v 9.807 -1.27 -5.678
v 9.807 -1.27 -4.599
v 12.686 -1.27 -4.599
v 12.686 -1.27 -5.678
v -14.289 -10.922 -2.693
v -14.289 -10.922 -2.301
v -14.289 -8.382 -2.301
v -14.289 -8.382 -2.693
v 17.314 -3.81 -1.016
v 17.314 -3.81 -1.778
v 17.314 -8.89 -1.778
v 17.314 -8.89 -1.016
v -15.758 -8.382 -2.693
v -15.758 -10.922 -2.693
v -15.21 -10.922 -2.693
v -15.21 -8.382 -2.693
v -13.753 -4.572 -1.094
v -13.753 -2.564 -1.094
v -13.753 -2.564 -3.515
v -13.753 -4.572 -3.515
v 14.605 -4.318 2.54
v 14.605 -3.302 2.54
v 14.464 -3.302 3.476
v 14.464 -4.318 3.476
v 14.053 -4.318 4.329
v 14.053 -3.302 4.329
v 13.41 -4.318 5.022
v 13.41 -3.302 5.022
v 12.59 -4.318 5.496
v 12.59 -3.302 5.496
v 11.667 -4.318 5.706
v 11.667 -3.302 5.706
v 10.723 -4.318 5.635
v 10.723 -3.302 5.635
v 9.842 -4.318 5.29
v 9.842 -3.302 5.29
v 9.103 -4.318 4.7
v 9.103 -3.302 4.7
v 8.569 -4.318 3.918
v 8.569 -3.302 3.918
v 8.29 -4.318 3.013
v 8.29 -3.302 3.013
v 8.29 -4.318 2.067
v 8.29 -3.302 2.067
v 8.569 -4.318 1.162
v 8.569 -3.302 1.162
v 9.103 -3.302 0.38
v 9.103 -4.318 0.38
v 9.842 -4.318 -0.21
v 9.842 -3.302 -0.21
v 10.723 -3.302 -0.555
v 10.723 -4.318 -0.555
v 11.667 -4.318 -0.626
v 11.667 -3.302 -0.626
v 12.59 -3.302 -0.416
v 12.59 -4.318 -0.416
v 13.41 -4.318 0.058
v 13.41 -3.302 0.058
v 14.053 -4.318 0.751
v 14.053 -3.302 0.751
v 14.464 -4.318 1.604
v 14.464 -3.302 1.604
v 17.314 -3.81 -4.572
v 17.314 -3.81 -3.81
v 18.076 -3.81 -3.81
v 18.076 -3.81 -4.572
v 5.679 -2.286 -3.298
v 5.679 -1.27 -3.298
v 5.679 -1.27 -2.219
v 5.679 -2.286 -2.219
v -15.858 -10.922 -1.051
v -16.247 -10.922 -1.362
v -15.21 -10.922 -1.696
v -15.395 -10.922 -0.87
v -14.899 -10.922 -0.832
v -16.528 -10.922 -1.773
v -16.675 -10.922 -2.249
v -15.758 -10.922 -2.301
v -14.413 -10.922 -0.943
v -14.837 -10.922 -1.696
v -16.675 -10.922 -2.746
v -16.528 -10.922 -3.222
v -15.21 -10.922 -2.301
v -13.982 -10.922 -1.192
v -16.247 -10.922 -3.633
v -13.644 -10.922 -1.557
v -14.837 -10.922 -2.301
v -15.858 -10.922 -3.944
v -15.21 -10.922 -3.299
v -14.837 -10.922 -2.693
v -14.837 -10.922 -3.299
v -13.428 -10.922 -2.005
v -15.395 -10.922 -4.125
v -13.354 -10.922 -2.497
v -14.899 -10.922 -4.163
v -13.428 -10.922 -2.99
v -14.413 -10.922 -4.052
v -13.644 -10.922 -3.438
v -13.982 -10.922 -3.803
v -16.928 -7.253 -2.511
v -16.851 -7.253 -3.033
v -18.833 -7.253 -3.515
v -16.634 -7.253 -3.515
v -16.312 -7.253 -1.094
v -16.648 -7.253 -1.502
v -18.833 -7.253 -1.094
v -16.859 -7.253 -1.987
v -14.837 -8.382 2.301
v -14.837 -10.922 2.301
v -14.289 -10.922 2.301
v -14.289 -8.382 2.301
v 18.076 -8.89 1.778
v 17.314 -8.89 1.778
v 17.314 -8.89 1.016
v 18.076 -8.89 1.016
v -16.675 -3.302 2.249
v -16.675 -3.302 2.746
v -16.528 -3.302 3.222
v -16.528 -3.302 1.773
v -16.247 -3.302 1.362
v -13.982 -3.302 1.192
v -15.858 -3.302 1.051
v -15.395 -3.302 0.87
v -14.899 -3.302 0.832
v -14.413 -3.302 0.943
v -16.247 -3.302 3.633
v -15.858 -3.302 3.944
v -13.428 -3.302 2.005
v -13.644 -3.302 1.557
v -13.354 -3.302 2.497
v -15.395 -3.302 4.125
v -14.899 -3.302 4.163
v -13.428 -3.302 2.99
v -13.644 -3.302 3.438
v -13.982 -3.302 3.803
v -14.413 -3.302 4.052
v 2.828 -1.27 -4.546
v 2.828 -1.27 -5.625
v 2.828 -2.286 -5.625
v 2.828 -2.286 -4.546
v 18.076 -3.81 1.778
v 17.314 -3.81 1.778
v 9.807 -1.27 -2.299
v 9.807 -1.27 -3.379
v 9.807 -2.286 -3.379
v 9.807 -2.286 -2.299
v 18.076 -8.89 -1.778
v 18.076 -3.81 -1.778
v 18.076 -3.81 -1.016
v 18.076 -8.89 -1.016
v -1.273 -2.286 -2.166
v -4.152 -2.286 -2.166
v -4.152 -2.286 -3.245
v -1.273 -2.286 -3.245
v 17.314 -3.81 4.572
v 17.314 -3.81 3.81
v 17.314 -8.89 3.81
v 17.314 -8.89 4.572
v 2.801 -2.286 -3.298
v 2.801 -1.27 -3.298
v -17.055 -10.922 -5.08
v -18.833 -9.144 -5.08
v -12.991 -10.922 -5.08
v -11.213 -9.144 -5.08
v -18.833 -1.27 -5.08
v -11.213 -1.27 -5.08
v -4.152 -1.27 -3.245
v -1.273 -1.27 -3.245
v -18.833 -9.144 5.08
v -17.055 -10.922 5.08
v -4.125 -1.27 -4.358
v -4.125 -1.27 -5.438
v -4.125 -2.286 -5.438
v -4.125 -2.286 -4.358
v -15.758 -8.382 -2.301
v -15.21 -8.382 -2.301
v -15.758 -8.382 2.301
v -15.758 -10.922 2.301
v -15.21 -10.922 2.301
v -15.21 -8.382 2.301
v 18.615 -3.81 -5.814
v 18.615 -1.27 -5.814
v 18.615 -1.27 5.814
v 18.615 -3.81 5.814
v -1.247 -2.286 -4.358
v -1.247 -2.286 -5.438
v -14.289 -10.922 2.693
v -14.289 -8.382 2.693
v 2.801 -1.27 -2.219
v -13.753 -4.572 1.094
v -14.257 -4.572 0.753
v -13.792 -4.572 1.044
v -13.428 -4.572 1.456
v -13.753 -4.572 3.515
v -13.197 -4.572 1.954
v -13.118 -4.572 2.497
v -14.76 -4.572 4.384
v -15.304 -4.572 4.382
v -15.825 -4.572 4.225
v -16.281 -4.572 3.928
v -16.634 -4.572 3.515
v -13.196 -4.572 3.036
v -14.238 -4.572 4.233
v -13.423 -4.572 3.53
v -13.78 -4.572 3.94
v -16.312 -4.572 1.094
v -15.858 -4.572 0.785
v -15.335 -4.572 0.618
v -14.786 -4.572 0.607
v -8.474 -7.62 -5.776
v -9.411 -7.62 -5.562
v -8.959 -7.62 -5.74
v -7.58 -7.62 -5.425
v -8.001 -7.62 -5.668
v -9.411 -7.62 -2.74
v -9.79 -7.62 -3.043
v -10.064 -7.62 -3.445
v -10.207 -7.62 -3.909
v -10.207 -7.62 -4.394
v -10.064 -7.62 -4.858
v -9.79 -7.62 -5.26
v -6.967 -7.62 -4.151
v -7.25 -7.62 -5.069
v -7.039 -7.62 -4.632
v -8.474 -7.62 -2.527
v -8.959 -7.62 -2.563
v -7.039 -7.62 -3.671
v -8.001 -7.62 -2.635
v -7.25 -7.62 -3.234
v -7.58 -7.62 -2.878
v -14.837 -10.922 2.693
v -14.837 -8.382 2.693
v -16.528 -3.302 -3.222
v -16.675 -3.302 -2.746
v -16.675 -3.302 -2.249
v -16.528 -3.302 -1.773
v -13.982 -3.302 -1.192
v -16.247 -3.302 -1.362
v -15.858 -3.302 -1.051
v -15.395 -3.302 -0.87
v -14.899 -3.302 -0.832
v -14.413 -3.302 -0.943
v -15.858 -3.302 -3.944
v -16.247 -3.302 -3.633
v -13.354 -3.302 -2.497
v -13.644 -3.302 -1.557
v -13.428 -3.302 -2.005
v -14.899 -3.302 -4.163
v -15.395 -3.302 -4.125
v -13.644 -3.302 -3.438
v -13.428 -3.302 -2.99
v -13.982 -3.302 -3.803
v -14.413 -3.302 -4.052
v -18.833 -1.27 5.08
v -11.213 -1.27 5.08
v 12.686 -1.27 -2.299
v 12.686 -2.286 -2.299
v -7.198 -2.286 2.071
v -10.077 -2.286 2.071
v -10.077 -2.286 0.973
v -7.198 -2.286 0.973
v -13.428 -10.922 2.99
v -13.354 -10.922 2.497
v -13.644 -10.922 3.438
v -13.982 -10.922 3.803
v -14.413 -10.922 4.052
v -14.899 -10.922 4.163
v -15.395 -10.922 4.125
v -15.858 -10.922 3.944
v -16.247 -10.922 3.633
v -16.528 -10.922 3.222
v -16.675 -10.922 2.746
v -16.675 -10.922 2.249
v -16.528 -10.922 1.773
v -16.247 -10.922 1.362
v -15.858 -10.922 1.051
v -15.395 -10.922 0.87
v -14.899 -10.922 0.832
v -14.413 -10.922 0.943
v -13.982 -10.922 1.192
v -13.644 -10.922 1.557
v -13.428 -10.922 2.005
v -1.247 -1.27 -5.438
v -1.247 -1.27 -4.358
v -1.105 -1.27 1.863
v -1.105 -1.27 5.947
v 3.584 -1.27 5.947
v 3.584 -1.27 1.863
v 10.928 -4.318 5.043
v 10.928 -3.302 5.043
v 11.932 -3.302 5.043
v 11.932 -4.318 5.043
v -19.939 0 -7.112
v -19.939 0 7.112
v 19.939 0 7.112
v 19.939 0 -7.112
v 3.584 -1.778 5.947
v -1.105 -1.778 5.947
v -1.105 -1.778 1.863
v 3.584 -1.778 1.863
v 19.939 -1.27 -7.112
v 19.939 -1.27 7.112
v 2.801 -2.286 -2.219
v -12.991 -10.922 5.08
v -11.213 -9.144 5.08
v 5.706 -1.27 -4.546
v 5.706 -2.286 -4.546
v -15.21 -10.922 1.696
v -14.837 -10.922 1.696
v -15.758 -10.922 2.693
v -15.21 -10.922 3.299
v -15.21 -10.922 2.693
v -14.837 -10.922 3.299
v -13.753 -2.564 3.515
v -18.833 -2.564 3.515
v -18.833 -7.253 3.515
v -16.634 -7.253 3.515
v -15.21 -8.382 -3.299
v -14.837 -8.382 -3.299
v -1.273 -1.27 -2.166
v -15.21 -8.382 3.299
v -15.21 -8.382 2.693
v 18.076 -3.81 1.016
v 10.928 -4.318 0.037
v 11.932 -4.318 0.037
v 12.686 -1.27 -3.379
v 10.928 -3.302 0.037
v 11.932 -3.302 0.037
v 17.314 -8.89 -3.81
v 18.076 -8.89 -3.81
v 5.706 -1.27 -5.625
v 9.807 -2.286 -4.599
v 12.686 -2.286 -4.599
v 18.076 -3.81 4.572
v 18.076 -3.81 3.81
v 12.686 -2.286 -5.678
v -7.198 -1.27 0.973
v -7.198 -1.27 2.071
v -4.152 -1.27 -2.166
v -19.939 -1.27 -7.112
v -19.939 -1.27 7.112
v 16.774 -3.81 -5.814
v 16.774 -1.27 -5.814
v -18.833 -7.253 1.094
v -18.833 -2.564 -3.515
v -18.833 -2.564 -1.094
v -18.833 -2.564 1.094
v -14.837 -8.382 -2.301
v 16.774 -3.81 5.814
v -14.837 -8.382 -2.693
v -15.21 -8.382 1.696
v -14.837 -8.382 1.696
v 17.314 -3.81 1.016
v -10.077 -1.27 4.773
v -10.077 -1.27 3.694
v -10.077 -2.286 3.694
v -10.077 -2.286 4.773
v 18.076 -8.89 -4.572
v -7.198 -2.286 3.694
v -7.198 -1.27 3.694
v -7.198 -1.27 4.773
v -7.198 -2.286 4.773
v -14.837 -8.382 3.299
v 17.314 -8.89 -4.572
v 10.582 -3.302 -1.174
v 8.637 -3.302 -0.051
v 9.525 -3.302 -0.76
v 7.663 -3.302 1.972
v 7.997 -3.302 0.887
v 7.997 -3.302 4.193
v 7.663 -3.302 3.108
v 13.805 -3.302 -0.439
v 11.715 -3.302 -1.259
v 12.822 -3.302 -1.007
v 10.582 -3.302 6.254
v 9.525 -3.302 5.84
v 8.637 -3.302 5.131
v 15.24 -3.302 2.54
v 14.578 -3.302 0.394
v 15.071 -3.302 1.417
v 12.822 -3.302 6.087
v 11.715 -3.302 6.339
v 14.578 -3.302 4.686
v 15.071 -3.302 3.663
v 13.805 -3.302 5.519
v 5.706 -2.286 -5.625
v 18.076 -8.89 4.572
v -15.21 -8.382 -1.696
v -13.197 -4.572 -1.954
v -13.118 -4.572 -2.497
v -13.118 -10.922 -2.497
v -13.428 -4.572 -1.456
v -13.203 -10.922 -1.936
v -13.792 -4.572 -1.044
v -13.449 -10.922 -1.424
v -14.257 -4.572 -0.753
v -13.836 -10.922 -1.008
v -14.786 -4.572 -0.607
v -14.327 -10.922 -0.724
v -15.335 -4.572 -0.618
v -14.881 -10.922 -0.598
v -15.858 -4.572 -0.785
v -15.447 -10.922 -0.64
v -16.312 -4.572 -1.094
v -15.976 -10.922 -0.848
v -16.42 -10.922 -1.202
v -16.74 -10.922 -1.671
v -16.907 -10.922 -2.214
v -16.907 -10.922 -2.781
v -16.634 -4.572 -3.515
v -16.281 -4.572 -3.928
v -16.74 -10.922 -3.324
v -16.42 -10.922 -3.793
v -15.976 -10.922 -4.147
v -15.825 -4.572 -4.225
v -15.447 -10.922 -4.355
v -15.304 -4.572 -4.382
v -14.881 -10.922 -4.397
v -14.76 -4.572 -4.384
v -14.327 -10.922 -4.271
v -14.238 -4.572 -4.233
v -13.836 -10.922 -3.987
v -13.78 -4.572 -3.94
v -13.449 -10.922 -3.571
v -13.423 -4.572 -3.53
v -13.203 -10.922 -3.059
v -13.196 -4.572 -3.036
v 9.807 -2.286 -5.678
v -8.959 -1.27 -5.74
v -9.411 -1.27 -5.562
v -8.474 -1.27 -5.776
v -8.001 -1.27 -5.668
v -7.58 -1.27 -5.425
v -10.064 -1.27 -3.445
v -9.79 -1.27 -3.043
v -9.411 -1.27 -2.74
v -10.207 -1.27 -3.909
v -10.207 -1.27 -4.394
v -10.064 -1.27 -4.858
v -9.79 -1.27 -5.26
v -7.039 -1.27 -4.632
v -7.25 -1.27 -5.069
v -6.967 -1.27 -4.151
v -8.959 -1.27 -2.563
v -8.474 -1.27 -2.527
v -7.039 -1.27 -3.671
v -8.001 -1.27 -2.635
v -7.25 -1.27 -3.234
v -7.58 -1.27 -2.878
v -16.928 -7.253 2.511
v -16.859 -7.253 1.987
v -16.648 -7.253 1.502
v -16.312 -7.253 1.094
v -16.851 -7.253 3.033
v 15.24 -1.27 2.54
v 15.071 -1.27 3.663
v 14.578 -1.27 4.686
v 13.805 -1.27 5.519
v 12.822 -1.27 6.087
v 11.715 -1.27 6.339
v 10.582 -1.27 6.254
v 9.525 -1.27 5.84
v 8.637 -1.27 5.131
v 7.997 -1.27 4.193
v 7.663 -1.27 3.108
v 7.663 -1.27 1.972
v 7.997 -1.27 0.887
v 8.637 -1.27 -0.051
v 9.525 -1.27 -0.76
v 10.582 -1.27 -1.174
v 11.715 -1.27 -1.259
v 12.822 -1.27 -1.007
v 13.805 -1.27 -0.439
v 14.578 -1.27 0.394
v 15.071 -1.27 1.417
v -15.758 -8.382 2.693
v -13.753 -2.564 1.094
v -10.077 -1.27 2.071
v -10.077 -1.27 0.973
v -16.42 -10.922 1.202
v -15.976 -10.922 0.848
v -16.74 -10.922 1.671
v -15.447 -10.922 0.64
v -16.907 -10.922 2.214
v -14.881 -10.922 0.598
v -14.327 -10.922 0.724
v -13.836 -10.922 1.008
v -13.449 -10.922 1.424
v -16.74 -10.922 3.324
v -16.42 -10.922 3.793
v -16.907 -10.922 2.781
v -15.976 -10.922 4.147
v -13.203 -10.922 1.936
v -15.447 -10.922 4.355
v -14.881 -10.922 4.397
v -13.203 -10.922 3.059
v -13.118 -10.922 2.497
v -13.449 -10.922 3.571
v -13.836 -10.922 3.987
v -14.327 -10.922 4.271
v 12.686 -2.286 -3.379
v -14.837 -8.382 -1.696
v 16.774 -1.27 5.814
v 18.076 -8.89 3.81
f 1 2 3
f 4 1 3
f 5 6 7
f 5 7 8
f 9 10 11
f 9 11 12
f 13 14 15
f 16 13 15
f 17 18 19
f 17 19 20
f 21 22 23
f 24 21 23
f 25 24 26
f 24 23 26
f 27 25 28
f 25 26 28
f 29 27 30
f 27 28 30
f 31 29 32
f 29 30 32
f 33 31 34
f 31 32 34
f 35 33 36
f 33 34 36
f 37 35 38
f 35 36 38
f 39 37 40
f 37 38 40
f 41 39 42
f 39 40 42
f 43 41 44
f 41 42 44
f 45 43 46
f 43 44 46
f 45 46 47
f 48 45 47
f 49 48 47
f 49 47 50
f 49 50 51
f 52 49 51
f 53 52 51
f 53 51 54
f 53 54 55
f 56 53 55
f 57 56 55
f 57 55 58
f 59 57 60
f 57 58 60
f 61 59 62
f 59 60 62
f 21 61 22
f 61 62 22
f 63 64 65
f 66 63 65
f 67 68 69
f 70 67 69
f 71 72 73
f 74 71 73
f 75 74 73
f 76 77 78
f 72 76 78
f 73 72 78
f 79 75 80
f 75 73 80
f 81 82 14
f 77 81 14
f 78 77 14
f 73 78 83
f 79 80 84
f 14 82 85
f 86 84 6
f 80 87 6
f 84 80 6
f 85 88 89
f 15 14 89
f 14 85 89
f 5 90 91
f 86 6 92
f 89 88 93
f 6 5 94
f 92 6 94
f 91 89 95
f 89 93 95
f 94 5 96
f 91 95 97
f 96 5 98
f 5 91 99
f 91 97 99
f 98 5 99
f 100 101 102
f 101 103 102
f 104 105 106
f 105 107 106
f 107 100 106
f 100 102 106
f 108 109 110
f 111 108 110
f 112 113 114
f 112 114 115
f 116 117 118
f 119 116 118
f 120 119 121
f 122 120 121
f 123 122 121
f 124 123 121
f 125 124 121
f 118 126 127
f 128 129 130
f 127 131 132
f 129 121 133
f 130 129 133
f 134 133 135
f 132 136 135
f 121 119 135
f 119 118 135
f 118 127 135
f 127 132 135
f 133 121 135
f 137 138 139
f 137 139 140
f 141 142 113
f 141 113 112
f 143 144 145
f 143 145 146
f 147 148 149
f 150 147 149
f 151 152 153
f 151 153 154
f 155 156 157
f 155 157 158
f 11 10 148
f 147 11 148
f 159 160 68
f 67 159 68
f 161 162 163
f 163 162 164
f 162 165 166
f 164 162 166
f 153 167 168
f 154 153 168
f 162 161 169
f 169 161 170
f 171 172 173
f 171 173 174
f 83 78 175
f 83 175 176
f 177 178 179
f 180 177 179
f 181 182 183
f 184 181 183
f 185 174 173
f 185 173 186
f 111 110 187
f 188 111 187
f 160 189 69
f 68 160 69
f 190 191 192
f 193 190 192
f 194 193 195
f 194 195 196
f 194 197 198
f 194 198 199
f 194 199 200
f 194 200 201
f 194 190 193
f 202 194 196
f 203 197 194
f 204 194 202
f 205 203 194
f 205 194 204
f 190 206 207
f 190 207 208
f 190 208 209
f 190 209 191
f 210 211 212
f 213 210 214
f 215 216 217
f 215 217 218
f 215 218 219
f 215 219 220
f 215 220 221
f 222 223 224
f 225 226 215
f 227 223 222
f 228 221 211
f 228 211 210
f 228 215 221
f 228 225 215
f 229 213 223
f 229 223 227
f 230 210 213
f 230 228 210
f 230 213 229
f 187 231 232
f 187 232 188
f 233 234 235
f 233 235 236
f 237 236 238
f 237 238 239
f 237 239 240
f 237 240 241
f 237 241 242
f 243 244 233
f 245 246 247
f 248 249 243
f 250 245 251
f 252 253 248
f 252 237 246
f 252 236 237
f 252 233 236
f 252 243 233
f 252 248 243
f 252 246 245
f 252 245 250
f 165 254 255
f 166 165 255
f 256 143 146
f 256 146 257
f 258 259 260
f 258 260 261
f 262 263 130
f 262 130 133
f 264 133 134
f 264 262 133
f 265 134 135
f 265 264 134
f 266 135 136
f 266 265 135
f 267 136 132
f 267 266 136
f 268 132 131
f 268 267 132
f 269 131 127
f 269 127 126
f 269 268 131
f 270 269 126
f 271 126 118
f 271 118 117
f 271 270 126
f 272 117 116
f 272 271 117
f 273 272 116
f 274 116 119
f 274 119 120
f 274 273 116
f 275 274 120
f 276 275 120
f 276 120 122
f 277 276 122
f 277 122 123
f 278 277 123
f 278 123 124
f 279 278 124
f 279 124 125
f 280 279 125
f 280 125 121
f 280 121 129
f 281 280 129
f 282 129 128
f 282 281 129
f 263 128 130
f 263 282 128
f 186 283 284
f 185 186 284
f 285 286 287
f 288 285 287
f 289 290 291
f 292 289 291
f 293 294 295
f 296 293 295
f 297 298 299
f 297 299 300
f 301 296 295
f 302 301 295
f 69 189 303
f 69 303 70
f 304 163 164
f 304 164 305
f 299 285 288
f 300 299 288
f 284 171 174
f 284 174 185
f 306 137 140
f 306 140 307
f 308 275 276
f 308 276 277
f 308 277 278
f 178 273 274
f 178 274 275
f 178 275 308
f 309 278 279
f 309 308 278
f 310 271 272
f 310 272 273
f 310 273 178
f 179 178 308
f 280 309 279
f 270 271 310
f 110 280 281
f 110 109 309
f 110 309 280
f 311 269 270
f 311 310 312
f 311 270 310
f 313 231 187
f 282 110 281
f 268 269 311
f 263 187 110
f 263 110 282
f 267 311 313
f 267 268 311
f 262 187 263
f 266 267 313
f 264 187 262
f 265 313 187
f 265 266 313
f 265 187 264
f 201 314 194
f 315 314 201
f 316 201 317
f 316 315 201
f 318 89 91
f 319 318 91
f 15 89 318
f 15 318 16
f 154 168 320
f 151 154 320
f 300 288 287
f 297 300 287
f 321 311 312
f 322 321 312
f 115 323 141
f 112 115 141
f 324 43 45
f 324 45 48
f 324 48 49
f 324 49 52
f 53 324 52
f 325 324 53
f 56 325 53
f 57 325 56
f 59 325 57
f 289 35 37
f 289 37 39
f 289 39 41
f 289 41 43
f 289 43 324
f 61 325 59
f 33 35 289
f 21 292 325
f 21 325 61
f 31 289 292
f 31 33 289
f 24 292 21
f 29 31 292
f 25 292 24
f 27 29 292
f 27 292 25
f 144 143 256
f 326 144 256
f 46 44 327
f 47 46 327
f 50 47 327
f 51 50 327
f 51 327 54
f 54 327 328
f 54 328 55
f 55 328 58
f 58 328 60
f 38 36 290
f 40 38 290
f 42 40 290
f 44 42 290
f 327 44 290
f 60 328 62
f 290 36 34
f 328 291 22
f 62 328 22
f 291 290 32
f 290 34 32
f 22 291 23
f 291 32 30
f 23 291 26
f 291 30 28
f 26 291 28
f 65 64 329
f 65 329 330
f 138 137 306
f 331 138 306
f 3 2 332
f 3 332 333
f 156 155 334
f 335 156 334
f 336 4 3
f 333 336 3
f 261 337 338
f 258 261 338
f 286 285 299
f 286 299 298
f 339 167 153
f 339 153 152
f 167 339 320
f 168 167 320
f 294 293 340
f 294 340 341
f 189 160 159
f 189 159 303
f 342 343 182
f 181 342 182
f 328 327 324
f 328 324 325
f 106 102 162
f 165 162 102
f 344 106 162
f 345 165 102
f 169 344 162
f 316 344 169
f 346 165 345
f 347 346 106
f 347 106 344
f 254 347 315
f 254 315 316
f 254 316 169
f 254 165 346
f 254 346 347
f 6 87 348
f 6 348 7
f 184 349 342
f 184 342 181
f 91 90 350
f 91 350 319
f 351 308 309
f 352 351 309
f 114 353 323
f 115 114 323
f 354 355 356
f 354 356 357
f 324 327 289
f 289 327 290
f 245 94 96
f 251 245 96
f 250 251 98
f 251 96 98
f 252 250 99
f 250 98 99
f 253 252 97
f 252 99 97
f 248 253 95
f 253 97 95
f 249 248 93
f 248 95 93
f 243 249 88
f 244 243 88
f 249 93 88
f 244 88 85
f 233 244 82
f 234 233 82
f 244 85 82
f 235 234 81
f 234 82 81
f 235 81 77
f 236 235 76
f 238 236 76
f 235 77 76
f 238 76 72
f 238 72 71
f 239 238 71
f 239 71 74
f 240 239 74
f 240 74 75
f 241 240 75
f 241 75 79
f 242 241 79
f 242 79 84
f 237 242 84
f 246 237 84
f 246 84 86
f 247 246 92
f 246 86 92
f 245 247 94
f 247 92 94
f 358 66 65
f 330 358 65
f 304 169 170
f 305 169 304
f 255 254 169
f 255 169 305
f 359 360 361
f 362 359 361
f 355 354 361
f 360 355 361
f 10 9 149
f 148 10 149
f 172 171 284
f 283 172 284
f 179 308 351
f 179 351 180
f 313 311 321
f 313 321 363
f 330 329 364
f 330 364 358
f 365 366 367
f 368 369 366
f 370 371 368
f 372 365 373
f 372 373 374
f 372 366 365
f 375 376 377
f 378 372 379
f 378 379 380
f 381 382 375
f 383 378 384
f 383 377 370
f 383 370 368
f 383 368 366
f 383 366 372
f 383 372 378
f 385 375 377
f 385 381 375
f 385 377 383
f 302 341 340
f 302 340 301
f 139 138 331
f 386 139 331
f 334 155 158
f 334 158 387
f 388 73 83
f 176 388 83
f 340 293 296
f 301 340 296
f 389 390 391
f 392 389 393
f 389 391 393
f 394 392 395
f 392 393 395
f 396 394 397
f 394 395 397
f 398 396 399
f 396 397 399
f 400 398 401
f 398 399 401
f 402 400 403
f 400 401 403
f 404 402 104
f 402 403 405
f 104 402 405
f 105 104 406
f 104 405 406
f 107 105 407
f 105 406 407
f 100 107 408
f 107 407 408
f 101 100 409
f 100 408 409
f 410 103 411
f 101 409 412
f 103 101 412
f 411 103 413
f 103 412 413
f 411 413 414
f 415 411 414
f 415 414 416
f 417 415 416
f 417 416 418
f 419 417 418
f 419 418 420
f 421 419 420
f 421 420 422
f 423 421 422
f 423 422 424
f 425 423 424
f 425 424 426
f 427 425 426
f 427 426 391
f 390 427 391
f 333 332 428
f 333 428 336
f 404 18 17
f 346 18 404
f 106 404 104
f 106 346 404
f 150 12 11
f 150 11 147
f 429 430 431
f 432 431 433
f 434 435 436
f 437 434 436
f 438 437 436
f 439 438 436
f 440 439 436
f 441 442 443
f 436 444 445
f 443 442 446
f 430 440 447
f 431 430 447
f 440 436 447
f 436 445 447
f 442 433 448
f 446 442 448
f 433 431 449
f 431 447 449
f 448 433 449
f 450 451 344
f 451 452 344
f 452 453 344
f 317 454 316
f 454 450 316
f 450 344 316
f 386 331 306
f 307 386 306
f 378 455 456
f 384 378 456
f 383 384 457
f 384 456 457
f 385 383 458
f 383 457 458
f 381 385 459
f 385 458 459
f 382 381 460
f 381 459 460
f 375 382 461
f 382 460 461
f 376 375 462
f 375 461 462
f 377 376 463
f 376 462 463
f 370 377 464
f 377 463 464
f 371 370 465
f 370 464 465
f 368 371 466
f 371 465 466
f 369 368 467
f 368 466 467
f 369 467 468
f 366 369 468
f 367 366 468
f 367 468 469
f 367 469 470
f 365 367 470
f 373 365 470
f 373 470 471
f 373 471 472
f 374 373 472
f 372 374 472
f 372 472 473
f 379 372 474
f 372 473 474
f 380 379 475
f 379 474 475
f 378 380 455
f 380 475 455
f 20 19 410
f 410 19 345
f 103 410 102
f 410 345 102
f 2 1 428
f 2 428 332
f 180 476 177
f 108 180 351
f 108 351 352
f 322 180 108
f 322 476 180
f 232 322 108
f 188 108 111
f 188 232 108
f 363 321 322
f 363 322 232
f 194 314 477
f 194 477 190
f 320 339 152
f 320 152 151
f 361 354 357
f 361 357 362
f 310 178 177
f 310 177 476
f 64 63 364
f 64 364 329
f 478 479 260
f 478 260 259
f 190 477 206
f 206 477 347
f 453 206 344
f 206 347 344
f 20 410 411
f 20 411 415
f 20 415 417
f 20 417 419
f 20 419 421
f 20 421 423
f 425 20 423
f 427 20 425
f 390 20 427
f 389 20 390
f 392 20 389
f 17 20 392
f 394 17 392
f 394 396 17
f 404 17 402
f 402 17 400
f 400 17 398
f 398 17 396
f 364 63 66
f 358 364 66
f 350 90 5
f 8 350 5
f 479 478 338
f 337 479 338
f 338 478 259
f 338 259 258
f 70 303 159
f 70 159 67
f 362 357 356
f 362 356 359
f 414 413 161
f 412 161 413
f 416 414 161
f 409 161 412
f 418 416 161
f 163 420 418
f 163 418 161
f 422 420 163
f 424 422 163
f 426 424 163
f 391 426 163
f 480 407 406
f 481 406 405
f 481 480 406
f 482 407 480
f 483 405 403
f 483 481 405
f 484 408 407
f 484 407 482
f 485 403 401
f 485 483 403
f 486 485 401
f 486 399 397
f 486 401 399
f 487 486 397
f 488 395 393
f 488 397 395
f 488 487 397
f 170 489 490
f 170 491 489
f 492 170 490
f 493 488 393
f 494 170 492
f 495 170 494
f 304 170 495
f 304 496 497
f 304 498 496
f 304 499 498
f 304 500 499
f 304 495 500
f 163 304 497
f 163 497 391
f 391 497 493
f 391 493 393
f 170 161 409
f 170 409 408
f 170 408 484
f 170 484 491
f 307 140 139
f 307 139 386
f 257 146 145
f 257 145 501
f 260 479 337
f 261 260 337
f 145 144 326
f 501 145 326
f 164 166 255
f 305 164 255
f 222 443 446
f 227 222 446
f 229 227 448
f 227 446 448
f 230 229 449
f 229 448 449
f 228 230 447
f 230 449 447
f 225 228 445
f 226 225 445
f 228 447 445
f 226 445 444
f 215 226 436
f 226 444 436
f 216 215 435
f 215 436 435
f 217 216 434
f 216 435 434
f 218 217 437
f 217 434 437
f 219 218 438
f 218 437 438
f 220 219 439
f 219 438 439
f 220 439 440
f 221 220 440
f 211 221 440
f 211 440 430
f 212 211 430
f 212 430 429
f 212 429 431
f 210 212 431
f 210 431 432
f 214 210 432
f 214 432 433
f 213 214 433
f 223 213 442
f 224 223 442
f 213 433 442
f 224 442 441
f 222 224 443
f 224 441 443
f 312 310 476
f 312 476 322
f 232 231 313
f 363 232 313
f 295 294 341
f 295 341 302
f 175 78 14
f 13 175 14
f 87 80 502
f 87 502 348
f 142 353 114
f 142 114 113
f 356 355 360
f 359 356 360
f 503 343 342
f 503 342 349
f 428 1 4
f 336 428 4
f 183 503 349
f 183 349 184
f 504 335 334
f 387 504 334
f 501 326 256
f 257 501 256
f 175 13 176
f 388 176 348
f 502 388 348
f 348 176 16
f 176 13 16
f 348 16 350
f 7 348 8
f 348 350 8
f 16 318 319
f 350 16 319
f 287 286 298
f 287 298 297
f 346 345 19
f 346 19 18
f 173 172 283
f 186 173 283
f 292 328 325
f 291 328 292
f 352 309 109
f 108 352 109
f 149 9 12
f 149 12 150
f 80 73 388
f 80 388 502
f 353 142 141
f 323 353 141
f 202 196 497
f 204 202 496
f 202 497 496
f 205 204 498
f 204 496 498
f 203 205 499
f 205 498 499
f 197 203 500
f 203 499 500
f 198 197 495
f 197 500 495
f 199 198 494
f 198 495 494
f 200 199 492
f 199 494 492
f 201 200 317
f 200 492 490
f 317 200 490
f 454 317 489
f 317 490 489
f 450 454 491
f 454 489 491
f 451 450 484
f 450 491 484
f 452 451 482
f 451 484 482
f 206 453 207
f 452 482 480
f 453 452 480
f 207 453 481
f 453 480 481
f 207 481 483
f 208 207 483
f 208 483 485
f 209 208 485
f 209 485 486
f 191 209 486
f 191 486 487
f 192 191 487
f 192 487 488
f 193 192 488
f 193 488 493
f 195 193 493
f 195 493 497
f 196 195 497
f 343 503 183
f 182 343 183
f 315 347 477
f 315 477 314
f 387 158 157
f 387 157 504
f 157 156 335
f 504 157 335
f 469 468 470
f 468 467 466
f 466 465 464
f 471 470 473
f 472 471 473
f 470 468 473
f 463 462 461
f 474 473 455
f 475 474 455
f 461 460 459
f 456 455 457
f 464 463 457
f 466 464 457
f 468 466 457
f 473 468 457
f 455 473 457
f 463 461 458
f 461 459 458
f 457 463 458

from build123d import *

# Parameters (mm, degrees)
F0_W      = 39.878
F0_H      = 14.224
F1_DEPTH  = 1.27
F2_W      = 7.62
F2_H      = 10.16
F3_DEPTH  = 9.652
F4_SIZE   = 1.778
F5_R      = 1.905
F6_DEPTH  = 6.35
F7_W      = 4.6894205734
F7_H      = 2.4203467183
F8_DEPTH  = 5.08
F9_R      = 1.6697821783
F10_DEPTH = 7.62
F11_W     = 0.3728192511
F11_H     = 0.6050870288
F11_W_2   = 0.5483608693
F11_H_2   = 0.3921133466
F12_DEPTH = 2.54
F14_W     = 1.8415860832
F14_H     = 11.6279795766
F15_DEPTH = 2.54
F16_W     = 0.762
F16_H     = 0.762
F17_DEPTH = 5.08
F18_R     = 1.6292454542
F19_DEPTH = 6.35
F20_W     = 4.6894233674
F20_H     = 4.0843365714
F21_DEPTH = 0.508
F22_R     = 3.81
F23_DEPTH = 2.032
F24_R     = 3.175
F24_W     = 1.0030101985
F24_H     = 5.0061298534
F25_DEPTH = 1.016
F26_W     = 2.878293395
F26_H     = 1.0793600231
F27_DEPTH = 1.016
F26_H_2   = 1.0977436526


with BuildPart() as f1:
    # F0 (on Front) → F1 (new body)
    with BuildSketch(Plane.XZ):
        Rectangle(F0_W, F0_H)
    extrude(amount=F1_DEPTH)


with BuildPart() as f3:
    # F2 (on face) → F3 (new body)
    with BuildSketch(Plane.XZ.offset(1.27)):
        with Locations((-15.0233691664, 0)):
            Rectangle(F2_W, F2_H)
    extrude(amount=F3_DEPTH)

    # F4
    f4_edges = [f3.edges().sort_by_distance(p)[0] for p in [
        (-18.833369, -10.922, 0),
        (-11.213369, -10.922, 0),
    ]]
    chamfer(f4_edges, length=F4_SIZE)

    # F5 (on face) → F6 (cut)
    with BuildSketch(Plane.XZ.offset(10.922)):
        with Locations((-15.0233691664, 2.4974399712)):
            Circle(F5_R)
        with Locations((-15.0233691664, -2.4974399712)):
            Circle(F5_R)
    extrude(amount=-F6_DEPTH, mode=Mode.SUBTRACT)

    # F7 (on face) → F8 (cut)
    with BuildSketch(Plane(origin=(-18.8333691664, 0, 0), x_dir=(0, -1, 0), z_dir=(-1, 0, 0))):
        with Locations((4.9085379578, 2.3046669085)):
            Rectangle(F7_W, F7_H)
        with Locations((4.9085379578, -2.3046669085)):
            Rectangle(F7_W, F7_H)
    extrude(amount=-F8_DEPTH, mode=Mode.SUBTRACT)


with BuildPart() as f10:
    # F9 (on face) → F10 (new body)
    with BuildSketch(Plane.XZ.offset(10.922)):
        with Locations((-15.0233691664, 2.4974399712)):
            Circle(F9_R)
    extrude(amount=-F10_DEPTH)

    # F11 (on face) → F12 (cut)
    with BuildSketch(Plane.XZ.offset(10.922)):
        with Locations((-15.0233691664, 2.9960401589)):
            Rectangle(F11_W, F11_H)
        with Locations((-14.5627791062, 2.4974399712)):
            Rectangle(F11_W_2, F11_H_2)
        with Locations((-15.0233691664, 2.4974399712)):
            Rectangle(F11_W, F11_H_2)
        with Locations((-15.4839592266, 2.4974399712)):
            Rectangle(F11_W_2, F11_H_2)
        with Locations((-15.0233691664, 1.9988397835)):
            Rectangle(F11_W, F11_H)
    extrude(amount=-F12_DEPTH, mode=Mode.SUBTRACT)


with BuildPart() as f13_1:
    # F13: instance of F10
    add(f10.part.mirror(Plane.XY))


with BuildPart() as f15:
    # F14 (on face) → F15 (new body)
    with BuildSketch(Plane.XZ.offset(1.27)):
        with Locations((17.6946166903, 0)):
            Rectangle(F14_W, F14_H)
    extrude(amount=F15_DEPTH)


with BuildPart() as f17:
    # F16 (on face) → F17 (new body)
    with BuildSketch(Plane.XZ.offset(3.81)):
        with Locations((17.6946166903, -1.397)):
            Rectangle(F16_W, F16_H)
    extrude(amount=F17_DEPTH)


with BuildPart() as f17b:
    # F16 (on face) → F17, piece 2 (new body)
    with BuildSketch(Plane.XZ.offset(3.81)):
        with Locations((17.6946166903, -4.191)):
            Rectangle(F16_W, F16_H)
    extrude(amount=F17_DEPTH)


with BuildPart() as f17c:
    # F16 (on face) → F17, piece 3 (new body)
    with BuildSketch(Plane.XZ.offset(3.81)):
        with Locations((17.6946166903, 1.397)):
            Rectangle(F16_W, F16_H)
    extrude(amount=F17_DEPTH)


with BuildPart() as f17d:
    # F16 (on face) → F17, piece 4 (new body)
    with BuildSketch(Plane.XZ.offset(3.81)):
        with Locations((17.6946166903, 4.191)):
            Rectangle(F16_W, F16_H)
    extrude(amount=F17_DEPTH)


with BuildPart() as f19:
    # F18 (on face) → F19 (new body)
    with BuildSketch(Plane.XZ.offset(1.27)):
        with Locations((-8.5961502045, -4.1514476761)):
            Circle(F18_R)
    extrude(amount=F19_DEPTH)


with BuildPart() as f21:
    # F20 (on face) → F21 (new body)
    with BuildSketch(Plane.XZ.offset(1.27)):
        with Locations((1.2396881357, 3.9048832841)):
            Rectangle(F20_W, F20_H)
    extrude(amount=F21_DEPTH)


with BuildPart() as f23:
    # F22 (on face) → F23 (new body)
    with BuildSketch(Plane.XZ.offset(1.27)):
        with Locations((11.43, 2.54)):
            Circle(F22_R)
    extrude(amount=F23_DEPTH)


with BuildPart() as f25:
    # F24 (on face) → F25 (new body)
    with BuildSketch(Plane.XZ.offset(3.302)):
        with Locations((11.43, 2.54)):
            Circle(F24_R)
        with Locations((11.43, 2.54)):
            Rectangle(F24_W, F24_H, mode=Mode.SUBTRACT)
    extrude(amount=F25_DEPTH)


with BuildPart() as f27:
    # F26 (on face) → F27 (new body)
    with BuildSketch(Plane.XZ.offset(1.27)):
        with Locations((-8.6374529637, 4.2334846221)):
            Rectangle(F26_W, F26_H)
    extrude(amount=F27_DEPTH)


with BuildPart() as f27b:
    # F26 (on face) → F27, piece 2 (new body)
    with BuildSketch(Plane.XZ.offset(1.27)):
        with Locations((-8.6374529637, 1.5217887805)):
            Rectangle(F26_W, F26_H_2)
    extrude(amount=F27_DEPTH)


with BuildPart() as f27c:
    # F26 (on face) → F27, piece 3 (new body)
    with BuildSketch(Plane.XZ.offset(1.27)):
        with Locations((-2.7124148328, -2.7052904479)):
            Rectangle(F26_W, F26_H)
    extrude(amount=F27_DEPTH)


with BuildPart() as f27d:
    # F26 (on face) → F27, piece 4 (new body)
    with BuildSketch(Plane.XZ.offset(1.27)):
        with Locations((-2.6856730692, -4.8980773427)):
            Rectangle(F26_W, F26_H)
    extrude(amount=F27_DEPTH)


with BuildPart() as f27e:
    # F26 (on face) → F27, piece 5 (new body)
    with BuildSketch(Plane.XZ.offset(1.27)):
        with Locations((4.2403256521, -2.7587728109)):
            Rectangle(F26_W, F26_H)
    extrude(amount=F27_DEPTH)


with BuildPart() as f27f:
    # F26 (on face) → F27, piece 6 (new body)
    with BuildSketch(Plane.XZ.offset(1.27)):
        with Locations((4.2670681141, -5.0852666609)):
            Rectangle(F26_W, F26_H)
    extrude(amount=F27_DEPTH)


with BuildPart() as f27g:
    # F26 (on face) → F27, piece 7 (new body)
    with BuildSketch(Plane.XZ.offset(1.27)):
        with Locations((11.2465489656, -2.8389971703)):
            Rectangle(F26_W, F26_H)
    extrude(amount=F27_DEPTH)


with BuildPart() as f27h:
    # F26 (on face) → F27, piece 8 (new body)
    with BuildSketch(Plane.XZ.offset(1.27)):
        with Locations((11.2465489656, -5.1387492567)):
            Rectangle(F26_W, F26_H)
    extrude(amount=F27_DEPTH)


solid = Compound([f1.part, f3.part, f10.part, f13_1.part, f15.part, f17.part, f17b.part, f17c.part, f17d.part, f19.part, f21.part, f23.part, f25.part, f27.part, f27b.part, f27c.part, f27d.part, f27e.part, f27f.part, f27g.part, f27h.part])
